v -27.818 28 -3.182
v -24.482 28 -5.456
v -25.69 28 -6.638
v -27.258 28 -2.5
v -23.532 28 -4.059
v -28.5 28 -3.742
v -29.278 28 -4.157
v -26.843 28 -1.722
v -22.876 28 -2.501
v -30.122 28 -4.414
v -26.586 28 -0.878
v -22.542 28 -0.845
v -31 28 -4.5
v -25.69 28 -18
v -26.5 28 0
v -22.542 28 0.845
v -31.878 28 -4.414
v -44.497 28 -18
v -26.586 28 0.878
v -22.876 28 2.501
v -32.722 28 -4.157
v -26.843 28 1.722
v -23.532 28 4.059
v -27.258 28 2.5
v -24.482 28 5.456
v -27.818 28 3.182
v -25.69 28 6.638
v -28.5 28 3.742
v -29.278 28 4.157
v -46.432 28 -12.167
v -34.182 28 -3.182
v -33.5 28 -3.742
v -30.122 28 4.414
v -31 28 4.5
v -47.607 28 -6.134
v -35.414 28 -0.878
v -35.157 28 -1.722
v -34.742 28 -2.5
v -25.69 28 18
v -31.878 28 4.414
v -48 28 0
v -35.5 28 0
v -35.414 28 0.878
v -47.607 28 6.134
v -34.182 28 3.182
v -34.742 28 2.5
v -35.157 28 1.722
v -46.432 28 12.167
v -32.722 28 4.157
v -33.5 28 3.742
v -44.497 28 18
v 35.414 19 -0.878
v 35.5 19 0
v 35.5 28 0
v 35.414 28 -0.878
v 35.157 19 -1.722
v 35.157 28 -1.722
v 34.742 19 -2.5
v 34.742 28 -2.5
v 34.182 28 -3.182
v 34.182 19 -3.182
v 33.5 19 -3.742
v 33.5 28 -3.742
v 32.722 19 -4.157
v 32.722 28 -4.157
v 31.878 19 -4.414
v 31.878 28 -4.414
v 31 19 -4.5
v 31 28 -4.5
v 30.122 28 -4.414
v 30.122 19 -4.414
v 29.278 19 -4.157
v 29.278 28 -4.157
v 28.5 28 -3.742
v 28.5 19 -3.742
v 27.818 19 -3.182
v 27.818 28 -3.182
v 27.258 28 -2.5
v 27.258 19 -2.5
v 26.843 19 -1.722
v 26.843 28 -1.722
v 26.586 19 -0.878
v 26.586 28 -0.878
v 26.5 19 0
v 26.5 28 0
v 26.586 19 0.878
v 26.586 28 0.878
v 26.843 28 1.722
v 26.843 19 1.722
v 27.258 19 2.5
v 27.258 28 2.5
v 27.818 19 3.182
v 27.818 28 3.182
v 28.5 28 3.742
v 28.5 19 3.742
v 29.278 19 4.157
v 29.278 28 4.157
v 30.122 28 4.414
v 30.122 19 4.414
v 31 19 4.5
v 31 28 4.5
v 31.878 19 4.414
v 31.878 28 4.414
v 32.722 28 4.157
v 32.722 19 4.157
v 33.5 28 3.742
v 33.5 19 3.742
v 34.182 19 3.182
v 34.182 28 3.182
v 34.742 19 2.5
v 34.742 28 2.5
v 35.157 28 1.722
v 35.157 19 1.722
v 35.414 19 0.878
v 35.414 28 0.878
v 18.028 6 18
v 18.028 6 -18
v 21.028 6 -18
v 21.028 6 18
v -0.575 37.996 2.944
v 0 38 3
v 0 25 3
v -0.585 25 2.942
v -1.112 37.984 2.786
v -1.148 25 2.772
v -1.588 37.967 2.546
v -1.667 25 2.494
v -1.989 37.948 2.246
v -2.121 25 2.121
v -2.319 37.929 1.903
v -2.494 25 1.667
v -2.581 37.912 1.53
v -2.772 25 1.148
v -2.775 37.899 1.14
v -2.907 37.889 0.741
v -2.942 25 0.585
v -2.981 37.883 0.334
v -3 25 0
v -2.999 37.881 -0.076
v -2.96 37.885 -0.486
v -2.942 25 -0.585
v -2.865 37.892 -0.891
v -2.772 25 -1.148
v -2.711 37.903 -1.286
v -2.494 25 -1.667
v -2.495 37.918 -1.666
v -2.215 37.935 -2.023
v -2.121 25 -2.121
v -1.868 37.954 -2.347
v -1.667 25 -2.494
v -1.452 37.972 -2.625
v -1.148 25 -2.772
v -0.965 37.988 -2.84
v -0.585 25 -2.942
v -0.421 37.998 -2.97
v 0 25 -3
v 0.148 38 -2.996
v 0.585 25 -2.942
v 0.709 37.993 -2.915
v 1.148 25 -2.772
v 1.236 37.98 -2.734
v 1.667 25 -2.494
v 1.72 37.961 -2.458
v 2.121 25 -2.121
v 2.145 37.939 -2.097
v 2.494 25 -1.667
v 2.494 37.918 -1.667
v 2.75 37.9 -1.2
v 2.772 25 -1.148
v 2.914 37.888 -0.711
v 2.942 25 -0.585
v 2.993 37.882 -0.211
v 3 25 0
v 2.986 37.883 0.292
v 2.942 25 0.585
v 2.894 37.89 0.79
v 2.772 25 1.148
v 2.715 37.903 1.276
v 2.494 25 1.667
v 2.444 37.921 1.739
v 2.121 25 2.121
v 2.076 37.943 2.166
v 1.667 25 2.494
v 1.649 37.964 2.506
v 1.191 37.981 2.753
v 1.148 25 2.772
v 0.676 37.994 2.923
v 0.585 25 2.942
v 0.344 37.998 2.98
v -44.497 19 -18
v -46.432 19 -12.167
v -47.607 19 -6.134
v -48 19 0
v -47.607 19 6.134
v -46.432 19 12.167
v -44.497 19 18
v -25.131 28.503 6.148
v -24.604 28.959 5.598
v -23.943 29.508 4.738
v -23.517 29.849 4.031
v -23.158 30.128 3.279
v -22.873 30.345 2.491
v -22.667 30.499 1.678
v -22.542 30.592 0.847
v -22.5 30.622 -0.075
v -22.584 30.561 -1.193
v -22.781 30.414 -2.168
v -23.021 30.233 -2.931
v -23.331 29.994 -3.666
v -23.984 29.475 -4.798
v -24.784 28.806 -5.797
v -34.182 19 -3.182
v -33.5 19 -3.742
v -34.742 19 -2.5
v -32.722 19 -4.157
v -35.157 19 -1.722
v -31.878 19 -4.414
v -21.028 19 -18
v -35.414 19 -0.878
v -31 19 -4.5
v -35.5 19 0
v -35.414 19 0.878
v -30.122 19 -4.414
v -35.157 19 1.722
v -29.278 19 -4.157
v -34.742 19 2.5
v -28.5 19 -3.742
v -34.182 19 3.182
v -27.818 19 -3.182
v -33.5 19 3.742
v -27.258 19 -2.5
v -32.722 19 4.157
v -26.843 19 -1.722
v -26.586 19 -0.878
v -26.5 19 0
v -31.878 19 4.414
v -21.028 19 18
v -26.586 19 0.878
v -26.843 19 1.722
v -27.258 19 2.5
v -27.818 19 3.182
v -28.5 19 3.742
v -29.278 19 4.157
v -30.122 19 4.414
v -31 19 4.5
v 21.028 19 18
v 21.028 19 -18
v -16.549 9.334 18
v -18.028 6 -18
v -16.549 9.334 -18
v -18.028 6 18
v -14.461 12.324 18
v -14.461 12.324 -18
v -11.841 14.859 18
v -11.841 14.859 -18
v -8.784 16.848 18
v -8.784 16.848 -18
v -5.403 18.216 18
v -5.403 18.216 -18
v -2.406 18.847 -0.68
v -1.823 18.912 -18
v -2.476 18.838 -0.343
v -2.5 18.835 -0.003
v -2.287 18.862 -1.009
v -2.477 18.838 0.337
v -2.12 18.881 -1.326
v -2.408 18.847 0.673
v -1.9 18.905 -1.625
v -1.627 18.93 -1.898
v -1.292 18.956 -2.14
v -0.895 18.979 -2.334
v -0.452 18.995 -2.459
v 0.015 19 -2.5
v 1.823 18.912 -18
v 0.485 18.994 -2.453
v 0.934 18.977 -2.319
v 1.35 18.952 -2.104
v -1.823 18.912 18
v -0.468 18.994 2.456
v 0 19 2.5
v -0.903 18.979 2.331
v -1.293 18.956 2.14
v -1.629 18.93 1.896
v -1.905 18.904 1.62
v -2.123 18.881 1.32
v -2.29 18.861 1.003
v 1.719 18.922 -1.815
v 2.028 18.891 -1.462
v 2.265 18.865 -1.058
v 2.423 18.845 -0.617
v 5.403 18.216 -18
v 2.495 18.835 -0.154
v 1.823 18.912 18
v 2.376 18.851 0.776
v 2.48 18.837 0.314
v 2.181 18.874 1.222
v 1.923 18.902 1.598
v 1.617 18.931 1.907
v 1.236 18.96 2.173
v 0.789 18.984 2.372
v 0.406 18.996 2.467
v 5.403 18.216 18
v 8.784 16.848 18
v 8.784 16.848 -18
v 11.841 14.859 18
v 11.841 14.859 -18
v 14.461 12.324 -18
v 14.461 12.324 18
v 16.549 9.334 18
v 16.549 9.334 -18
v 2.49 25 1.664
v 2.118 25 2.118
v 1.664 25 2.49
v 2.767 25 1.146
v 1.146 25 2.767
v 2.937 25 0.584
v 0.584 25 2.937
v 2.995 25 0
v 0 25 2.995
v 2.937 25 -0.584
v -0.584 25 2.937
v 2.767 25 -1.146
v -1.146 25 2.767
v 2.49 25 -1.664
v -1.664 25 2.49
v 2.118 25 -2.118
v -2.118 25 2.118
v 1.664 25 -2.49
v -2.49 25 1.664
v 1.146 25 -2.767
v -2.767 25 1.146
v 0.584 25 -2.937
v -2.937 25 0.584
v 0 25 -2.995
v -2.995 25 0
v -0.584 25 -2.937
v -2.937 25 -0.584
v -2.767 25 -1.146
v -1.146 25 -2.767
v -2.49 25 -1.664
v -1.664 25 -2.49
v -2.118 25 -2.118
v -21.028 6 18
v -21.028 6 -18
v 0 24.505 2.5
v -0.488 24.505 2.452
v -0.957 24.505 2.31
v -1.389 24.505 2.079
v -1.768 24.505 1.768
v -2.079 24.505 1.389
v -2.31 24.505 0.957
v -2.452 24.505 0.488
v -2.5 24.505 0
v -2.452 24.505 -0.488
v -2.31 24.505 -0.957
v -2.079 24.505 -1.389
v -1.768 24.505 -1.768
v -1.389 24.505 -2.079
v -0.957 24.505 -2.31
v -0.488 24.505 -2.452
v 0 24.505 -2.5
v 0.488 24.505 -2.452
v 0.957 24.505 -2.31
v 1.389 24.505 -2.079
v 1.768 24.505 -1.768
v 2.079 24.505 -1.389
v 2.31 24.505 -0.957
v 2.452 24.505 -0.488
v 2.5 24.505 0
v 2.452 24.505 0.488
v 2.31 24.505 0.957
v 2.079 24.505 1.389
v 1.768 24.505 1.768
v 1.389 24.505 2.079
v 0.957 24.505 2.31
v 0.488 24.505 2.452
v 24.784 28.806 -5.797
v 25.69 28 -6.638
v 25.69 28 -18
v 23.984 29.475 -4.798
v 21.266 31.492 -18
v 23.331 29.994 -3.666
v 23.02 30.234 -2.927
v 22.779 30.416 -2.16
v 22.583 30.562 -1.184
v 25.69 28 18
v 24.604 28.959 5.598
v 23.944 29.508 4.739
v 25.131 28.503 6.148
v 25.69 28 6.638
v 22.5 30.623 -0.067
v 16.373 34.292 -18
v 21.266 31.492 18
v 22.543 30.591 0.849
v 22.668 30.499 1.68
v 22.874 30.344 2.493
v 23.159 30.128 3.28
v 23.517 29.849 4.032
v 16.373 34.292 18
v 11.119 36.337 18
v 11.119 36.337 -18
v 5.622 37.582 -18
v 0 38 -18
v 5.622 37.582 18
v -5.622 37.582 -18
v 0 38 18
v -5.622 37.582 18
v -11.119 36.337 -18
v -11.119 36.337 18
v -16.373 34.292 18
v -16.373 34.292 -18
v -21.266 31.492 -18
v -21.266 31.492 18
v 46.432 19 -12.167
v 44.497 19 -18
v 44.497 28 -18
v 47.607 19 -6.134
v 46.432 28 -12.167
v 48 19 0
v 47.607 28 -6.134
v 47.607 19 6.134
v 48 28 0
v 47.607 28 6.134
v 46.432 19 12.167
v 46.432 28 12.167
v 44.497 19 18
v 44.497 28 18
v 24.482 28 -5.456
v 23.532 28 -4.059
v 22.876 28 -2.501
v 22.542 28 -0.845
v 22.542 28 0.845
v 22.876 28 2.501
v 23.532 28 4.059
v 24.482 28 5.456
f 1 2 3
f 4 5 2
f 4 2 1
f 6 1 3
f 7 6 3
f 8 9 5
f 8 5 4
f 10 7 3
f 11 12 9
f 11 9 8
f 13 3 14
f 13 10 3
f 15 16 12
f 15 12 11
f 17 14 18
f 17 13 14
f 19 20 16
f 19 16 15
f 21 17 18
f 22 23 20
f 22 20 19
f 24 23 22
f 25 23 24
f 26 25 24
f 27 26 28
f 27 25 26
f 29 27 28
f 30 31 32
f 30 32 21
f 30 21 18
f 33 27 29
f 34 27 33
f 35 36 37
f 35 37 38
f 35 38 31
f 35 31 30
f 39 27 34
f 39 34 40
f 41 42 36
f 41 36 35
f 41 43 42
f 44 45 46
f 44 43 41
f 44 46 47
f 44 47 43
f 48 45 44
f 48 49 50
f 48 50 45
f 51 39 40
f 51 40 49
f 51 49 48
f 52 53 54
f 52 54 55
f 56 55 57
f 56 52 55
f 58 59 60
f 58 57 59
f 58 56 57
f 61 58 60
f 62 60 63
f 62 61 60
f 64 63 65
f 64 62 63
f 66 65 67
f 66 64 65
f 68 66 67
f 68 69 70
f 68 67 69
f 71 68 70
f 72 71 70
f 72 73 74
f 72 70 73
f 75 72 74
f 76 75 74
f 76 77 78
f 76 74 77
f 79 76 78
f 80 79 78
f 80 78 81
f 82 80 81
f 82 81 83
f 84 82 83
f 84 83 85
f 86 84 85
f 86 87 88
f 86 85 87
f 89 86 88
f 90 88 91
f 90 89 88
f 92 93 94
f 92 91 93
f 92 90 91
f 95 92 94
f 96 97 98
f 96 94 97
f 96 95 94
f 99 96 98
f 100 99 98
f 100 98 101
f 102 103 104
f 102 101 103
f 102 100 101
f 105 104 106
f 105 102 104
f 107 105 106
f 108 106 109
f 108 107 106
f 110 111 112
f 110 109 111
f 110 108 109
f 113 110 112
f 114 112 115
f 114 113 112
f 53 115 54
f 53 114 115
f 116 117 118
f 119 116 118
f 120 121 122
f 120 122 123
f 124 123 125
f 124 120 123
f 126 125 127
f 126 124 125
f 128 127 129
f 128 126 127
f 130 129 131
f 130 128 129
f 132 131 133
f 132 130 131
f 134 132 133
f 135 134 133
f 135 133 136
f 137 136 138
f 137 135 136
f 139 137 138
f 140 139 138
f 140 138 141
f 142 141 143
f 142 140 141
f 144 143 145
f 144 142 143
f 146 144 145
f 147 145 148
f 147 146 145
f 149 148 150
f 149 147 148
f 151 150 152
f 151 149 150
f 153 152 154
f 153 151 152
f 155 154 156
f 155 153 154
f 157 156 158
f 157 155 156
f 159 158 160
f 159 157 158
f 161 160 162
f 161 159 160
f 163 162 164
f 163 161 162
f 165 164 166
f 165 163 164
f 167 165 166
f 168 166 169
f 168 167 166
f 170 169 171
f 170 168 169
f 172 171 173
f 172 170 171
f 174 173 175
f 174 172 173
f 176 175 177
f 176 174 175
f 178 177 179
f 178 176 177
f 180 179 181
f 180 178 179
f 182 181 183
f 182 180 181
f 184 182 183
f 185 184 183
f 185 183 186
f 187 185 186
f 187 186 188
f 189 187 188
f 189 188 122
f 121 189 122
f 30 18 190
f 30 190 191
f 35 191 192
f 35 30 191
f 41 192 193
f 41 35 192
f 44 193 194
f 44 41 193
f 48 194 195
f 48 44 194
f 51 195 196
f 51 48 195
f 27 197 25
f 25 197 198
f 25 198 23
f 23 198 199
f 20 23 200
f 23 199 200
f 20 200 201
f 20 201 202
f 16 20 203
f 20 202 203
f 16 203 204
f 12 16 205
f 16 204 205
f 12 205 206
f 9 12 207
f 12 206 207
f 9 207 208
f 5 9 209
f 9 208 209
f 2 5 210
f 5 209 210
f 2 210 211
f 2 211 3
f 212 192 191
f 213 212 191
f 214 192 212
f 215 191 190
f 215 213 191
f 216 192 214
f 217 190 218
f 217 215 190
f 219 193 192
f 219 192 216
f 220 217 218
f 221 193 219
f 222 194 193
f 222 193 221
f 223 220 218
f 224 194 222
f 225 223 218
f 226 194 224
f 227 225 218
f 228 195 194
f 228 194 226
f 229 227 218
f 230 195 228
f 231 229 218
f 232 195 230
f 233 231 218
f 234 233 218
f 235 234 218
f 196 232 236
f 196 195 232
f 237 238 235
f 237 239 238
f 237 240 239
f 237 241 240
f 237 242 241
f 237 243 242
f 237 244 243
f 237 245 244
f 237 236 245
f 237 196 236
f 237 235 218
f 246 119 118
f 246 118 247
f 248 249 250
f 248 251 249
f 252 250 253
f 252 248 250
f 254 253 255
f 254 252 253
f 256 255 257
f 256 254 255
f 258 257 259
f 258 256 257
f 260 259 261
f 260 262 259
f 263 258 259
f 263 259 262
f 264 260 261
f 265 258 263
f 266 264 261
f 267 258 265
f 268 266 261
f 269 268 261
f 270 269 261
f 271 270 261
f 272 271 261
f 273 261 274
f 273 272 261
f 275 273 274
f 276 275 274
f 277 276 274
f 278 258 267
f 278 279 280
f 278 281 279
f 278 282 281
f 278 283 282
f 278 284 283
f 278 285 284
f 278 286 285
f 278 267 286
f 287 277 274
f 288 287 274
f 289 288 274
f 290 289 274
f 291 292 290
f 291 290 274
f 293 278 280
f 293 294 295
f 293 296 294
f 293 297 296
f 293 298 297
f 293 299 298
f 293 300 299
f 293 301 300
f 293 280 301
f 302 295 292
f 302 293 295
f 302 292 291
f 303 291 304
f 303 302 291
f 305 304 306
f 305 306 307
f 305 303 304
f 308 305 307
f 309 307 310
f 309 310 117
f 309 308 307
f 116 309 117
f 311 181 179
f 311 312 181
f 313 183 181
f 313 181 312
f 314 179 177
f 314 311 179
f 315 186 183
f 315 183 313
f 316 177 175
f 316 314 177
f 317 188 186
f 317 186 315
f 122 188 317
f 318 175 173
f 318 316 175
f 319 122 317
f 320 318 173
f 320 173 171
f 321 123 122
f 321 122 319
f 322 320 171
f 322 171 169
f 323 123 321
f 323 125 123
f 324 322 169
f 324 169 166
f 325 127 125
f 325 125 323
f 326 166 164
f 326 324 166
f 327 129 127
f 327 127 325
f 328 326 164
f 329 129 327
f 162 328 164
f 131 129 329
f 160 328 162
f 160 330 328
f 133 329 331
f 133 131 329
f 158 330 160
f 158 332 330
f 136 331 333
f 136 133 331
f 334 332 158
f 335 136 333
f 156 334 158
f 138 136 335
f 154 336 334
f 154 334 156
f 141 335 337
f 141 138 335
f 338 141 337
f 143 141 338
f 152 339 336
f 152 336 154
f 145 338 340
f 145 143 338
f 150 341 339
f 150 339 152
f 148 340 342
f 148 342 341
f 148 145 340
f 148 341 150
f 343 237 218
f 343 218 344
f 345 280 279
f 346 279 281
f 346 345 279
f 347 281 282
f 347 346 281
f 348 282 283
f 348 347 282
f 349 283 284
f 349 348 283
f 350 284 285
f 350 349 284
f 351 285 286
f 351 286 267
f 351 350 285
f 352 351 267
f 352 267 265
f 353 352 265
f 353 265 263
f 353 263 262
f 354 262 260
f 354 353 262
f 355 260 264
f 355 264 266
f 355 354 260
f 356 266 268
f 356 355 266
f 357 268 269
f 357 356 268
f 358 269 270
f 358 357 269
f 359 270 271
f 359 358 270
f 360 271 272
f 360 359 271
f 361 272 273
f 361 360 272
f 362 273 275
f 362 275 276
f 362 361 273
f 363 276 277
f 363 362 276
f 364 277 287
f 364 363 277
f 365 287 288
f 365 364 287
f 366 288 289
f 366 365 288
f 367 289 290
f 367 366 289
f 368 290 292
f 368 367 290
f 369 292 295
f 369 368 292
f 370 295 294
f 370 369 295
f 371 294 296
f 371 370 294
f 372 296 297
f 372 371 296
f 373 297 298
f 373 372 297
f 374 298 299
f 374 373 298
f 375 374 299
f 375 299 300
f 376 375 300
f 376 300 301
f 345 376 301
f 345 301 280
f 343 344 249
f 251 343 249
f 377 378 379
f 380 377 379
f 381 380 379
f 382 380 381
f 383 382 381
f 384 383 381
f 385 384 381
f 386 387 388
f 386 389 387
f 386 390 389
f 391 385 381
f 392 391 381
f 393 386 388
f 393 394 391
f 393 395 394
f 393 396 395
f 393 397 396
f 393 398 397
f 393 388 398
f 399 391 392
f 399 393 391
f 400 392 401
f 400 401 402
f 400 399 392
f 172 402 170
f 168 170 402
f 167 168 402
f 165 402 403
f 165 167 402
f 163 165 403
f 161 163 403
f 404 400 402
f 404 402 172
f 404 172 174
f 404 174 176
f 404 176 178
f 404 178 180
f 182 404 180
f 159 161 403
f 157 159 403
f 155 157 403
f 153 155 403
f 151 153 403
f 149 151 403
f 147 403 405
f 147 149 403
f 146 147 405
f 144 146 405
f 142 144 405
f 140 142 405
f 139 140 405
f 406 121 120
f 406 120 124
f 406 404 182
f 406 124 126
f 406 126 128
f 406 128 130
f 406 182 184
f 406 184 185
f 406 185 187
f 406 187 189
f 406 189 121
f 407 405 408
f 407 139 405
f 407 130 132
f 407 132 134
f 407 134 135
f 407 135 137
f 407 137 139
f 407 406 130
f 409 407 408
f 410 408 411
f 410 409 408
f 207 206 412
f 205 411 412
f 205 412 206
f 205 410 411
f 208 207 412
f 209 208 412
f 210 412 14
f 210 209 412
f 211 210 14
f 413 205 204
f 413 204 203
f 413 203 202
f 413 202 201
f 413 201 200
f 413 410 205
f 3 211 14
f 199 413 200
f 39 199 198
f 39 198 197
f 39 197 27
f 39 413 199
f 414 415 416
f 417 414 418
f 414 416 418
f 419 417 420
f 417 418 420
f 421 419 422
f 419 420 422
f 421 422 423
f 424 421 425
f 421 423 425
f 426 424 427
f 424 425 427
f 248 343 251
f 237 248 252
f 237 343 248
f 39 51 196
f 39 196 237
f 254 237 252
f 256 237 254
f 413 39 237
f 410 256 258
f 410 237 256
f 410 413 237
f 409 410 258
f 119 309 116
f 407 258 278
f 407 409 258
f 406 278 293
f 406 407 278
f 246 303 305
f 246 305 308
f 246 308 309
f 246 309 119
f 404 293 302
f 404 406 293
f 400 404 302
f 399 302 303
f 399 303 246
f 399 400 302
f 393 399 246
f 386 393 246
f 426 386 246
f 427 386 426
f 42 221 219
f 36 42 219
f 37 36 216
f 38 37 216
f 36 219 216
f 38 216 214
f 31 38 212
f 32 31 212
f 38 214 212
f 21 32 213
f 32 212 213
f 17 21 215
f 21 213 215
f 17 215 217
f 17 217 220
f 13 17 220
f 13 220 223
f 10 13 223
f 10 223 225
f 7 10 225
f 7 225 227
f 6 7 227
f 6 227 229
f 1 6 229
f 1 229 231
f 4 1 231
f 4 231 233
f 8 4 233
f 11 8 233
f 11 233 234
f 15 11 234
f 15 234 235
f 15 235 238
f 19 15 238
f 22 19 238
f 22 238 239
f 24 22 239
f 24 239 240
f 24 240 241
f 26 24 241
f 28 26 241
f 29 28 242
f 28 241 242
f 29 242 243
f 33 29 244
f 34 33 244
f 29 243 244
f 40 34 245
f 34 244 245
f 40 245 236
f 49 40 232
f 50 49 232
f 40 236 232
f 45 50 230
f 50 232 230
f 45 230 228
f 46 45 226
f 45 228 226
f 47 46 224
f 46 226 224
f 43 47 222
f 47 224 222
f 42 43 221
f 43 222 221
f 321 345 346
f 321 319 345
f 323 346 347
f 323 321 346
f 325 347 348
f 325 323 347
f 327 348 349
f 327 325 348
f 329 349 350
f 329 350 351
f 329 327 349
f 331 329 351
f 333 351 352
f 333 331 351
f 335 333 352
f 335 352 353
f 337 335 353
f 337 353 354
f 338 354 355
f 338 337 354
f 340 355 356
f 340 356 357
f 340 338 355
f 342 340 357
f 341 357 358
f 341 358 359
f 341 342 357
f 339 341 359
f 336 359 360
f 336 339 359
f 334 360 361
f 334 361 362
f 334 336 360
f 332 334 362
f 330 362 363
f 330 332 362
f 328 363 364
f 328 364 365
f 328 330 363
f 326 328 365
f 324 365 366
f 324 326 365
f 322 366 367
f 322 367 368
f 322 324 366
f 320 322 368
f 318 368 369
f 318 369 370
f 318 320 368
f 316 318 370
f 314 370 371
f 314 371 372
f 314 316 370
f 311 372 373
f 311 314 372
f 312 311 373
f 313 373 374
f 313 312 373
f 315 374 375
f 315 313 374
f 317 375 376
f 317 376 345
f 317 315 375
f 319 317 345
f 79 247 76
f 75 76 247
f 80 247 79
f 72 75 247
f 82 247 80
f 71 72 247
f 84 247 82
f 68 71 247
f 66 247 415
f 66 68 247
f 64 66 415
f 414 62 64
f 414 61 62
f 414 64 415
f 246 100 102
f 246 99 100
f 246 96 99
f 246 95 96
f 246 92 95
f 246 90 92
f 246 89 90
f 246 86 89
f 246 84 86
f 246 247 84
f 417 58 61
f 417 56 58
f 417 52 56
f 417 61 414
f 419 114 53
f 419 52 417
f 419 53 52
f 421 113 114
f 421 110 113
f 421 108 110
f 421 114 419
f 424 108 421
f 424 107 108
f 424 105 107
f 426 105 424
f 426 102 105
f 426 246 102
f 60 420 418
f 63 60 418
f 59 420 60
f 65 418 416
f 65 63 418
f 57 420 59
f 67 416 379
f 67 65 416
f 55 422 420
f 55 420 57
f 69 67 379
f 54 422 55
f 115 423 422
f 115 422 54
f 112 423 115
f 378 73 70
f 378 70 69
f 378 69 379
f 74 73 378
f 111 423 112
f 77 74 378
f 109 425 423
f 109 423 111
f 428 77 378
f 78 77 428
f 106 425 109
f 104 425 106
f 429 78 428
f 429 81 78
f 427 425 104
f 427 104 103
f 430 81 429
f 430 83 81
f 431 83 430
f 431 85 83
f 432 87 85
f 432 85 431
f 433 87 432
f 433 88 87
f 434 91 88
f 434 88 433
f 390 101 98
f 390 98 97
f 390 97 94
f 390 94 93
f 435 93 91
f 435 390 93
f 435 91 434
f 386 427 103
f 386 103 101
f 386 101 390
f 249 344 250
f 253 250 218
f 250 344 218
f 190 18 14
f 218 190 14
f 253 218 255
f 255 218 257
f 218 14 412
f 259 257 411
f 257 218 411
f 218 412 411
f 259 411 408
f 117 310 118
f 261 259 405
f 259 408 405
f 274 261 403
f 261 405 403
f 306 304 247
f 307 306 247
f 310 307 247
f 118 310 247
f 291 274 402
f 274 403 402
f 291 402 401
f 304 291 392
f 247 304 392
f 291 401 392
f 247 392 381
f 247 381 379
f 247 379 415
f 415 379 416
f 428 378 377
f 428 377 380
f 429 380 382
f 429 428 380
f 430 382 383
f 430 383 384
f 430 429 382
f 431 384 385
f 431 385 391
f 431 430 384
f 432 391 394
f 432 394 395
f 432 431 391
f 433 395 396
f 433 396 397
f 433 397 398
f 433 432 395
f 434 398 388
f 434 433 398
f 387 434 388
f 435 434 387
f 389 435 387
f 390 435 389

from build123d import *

# Parameters (mm, degrees)
BOSS_EXTRUDE2_DEPTH   = 18
F_6_0MM_DOWEL_HOLE4_D = 9
SKETCH16_R            = 8.5
CUT_EXTRUDE1_DEPTH    = 10
SKETCH17_R            = 8.5
CUT_EXTRUDE2_DEPTH    = 45
CUT_EXTRUDE3_DEPTH    = 23.0000001


with BuildPart() as part:
    # Sketch1 → Boss-Extrude2 (new body, symmetric)
    with BuildSketch(Plane.XY):
        with BuildLine():
            Line((18.027756377, 6), (21.027756377, 6))
            Line((21.027756377, 6), (21.027756377, 19))
            Line((21.027756377, 19), (50, 19))
            Line((50, 19), (50, 28))
            Line((50, 28), (25.690465157, 28))
            ThreePointArc((25.690465157, 28), (0, 38), (-25.690465157, 28))
            Line((-25.690465157, 28), (-50, 28))
            Line((-50, 28), (-50, 19))
            Line((-50, 19), (-21.027756377, 19))
            Line((-21.027756377, 19), (-21.027756377, 6))
            Line((-21.027756377, 6), (-18.027756377, 6))
            ThreePointArc((-18.027756377, 6), (0, 19), (18.027756377, 6))
        make_face()
    extrude(amount=BOSS_EXTRUDE2_DEPTH, both=True)

    # Ø6.0mm Dowel Hole4 (through all)
    with Locations(Plane(origin=(0, 28, 0), x_dir=(1, 0, 0), z_dir=(0, 1, 0))):
        with Locations((-31, 0)):
            f_6_0mm_dowel_hole4 = Hole(F_6_0MM_DOWEL_HOLE4_D / 2)

    # Mirror1: Ø6.0mm Dowel Hole4 across plane
    add(f_6_0mm_dowel_hole4.mirror(Plane(origin=(0, 0, 0), x_dir=(0, 0, 1), z_dir=(1, 0, 0))), mode=Mode.SUBTRACT)

    # Sketch16 → Cut-Extrude1 (cut)
    with BuildSketch(Plane(origin=(0, 38, 0), x_dir=(1, 0, 0), z_dir=(0, 1, 0))):
        with Locations((-31, 0)):
            Circle(SKETCH16_R)
    extrude(amount=-CUT_EXTRUDE1_DEPTH, mode=Mode.SUBTRACT)

    # Sketch17 → Cut-Extrude2 (cut)
    with BuildSketch(Plane(origin=(0, 28, 0), x_dir=(1, 0, 0), z_dir=(0, 1, 0))):
        with Locations((31, 0)):
            Circle(SKETCH17_R)
    extrude(amount=CUT_EXTRUDE2_DEPTH, mode=Mode.SUBTRACT)

    # Sketch18 → CBORE for M5 Hex Head Bolt1 (revolve, cut)
    with BuildSketch(Plane(origin=(0, 38, 0), x_dir=(0, 0, 1), z_dir=(1, 0, 0))):
        Polygon((0, 0), (0, 32), (2.5, 32), (2.5, 13.495), (2.995, 13), (3, 13), (3, 0), align=None)
    revolve(axis=Axis((0, 44.35, 0), (0, -1, 0)), mode=Mode.SUBTRACT)

    # Sketch19 → Cut-Extrude3 (cut, through all)
    with BuildSketch(Plane(origin=(0, 28, 0), x_dir=(1, 0, 0), z_dir=(0, 1, 0))):
        with BuildLine():
            Line((-50, 18), (-44.497190923, 18))
            ThreePointArc((-44.497190923, 18), (-48, 0), (-44.497190923, -18))
            Line((-44.497190923, -18), (-50, -18))
            Line((-50, -18), (-50, 18))
        make_face()
    cut_extrude3 = extrude(amount=-CUT_EXTRUDE3_DEPTH, mode=Mode.SUBTRACT)

    # Mirror2: Cut-Extrude3 across plane
    add(cut_extrude3.mirror(Plane(origin=(0, 0, 0), x_dir=(0, 0, 1), z_dir=(1, 0, 0))), mode=Mode.SUBTRACT)


solid = part.part
